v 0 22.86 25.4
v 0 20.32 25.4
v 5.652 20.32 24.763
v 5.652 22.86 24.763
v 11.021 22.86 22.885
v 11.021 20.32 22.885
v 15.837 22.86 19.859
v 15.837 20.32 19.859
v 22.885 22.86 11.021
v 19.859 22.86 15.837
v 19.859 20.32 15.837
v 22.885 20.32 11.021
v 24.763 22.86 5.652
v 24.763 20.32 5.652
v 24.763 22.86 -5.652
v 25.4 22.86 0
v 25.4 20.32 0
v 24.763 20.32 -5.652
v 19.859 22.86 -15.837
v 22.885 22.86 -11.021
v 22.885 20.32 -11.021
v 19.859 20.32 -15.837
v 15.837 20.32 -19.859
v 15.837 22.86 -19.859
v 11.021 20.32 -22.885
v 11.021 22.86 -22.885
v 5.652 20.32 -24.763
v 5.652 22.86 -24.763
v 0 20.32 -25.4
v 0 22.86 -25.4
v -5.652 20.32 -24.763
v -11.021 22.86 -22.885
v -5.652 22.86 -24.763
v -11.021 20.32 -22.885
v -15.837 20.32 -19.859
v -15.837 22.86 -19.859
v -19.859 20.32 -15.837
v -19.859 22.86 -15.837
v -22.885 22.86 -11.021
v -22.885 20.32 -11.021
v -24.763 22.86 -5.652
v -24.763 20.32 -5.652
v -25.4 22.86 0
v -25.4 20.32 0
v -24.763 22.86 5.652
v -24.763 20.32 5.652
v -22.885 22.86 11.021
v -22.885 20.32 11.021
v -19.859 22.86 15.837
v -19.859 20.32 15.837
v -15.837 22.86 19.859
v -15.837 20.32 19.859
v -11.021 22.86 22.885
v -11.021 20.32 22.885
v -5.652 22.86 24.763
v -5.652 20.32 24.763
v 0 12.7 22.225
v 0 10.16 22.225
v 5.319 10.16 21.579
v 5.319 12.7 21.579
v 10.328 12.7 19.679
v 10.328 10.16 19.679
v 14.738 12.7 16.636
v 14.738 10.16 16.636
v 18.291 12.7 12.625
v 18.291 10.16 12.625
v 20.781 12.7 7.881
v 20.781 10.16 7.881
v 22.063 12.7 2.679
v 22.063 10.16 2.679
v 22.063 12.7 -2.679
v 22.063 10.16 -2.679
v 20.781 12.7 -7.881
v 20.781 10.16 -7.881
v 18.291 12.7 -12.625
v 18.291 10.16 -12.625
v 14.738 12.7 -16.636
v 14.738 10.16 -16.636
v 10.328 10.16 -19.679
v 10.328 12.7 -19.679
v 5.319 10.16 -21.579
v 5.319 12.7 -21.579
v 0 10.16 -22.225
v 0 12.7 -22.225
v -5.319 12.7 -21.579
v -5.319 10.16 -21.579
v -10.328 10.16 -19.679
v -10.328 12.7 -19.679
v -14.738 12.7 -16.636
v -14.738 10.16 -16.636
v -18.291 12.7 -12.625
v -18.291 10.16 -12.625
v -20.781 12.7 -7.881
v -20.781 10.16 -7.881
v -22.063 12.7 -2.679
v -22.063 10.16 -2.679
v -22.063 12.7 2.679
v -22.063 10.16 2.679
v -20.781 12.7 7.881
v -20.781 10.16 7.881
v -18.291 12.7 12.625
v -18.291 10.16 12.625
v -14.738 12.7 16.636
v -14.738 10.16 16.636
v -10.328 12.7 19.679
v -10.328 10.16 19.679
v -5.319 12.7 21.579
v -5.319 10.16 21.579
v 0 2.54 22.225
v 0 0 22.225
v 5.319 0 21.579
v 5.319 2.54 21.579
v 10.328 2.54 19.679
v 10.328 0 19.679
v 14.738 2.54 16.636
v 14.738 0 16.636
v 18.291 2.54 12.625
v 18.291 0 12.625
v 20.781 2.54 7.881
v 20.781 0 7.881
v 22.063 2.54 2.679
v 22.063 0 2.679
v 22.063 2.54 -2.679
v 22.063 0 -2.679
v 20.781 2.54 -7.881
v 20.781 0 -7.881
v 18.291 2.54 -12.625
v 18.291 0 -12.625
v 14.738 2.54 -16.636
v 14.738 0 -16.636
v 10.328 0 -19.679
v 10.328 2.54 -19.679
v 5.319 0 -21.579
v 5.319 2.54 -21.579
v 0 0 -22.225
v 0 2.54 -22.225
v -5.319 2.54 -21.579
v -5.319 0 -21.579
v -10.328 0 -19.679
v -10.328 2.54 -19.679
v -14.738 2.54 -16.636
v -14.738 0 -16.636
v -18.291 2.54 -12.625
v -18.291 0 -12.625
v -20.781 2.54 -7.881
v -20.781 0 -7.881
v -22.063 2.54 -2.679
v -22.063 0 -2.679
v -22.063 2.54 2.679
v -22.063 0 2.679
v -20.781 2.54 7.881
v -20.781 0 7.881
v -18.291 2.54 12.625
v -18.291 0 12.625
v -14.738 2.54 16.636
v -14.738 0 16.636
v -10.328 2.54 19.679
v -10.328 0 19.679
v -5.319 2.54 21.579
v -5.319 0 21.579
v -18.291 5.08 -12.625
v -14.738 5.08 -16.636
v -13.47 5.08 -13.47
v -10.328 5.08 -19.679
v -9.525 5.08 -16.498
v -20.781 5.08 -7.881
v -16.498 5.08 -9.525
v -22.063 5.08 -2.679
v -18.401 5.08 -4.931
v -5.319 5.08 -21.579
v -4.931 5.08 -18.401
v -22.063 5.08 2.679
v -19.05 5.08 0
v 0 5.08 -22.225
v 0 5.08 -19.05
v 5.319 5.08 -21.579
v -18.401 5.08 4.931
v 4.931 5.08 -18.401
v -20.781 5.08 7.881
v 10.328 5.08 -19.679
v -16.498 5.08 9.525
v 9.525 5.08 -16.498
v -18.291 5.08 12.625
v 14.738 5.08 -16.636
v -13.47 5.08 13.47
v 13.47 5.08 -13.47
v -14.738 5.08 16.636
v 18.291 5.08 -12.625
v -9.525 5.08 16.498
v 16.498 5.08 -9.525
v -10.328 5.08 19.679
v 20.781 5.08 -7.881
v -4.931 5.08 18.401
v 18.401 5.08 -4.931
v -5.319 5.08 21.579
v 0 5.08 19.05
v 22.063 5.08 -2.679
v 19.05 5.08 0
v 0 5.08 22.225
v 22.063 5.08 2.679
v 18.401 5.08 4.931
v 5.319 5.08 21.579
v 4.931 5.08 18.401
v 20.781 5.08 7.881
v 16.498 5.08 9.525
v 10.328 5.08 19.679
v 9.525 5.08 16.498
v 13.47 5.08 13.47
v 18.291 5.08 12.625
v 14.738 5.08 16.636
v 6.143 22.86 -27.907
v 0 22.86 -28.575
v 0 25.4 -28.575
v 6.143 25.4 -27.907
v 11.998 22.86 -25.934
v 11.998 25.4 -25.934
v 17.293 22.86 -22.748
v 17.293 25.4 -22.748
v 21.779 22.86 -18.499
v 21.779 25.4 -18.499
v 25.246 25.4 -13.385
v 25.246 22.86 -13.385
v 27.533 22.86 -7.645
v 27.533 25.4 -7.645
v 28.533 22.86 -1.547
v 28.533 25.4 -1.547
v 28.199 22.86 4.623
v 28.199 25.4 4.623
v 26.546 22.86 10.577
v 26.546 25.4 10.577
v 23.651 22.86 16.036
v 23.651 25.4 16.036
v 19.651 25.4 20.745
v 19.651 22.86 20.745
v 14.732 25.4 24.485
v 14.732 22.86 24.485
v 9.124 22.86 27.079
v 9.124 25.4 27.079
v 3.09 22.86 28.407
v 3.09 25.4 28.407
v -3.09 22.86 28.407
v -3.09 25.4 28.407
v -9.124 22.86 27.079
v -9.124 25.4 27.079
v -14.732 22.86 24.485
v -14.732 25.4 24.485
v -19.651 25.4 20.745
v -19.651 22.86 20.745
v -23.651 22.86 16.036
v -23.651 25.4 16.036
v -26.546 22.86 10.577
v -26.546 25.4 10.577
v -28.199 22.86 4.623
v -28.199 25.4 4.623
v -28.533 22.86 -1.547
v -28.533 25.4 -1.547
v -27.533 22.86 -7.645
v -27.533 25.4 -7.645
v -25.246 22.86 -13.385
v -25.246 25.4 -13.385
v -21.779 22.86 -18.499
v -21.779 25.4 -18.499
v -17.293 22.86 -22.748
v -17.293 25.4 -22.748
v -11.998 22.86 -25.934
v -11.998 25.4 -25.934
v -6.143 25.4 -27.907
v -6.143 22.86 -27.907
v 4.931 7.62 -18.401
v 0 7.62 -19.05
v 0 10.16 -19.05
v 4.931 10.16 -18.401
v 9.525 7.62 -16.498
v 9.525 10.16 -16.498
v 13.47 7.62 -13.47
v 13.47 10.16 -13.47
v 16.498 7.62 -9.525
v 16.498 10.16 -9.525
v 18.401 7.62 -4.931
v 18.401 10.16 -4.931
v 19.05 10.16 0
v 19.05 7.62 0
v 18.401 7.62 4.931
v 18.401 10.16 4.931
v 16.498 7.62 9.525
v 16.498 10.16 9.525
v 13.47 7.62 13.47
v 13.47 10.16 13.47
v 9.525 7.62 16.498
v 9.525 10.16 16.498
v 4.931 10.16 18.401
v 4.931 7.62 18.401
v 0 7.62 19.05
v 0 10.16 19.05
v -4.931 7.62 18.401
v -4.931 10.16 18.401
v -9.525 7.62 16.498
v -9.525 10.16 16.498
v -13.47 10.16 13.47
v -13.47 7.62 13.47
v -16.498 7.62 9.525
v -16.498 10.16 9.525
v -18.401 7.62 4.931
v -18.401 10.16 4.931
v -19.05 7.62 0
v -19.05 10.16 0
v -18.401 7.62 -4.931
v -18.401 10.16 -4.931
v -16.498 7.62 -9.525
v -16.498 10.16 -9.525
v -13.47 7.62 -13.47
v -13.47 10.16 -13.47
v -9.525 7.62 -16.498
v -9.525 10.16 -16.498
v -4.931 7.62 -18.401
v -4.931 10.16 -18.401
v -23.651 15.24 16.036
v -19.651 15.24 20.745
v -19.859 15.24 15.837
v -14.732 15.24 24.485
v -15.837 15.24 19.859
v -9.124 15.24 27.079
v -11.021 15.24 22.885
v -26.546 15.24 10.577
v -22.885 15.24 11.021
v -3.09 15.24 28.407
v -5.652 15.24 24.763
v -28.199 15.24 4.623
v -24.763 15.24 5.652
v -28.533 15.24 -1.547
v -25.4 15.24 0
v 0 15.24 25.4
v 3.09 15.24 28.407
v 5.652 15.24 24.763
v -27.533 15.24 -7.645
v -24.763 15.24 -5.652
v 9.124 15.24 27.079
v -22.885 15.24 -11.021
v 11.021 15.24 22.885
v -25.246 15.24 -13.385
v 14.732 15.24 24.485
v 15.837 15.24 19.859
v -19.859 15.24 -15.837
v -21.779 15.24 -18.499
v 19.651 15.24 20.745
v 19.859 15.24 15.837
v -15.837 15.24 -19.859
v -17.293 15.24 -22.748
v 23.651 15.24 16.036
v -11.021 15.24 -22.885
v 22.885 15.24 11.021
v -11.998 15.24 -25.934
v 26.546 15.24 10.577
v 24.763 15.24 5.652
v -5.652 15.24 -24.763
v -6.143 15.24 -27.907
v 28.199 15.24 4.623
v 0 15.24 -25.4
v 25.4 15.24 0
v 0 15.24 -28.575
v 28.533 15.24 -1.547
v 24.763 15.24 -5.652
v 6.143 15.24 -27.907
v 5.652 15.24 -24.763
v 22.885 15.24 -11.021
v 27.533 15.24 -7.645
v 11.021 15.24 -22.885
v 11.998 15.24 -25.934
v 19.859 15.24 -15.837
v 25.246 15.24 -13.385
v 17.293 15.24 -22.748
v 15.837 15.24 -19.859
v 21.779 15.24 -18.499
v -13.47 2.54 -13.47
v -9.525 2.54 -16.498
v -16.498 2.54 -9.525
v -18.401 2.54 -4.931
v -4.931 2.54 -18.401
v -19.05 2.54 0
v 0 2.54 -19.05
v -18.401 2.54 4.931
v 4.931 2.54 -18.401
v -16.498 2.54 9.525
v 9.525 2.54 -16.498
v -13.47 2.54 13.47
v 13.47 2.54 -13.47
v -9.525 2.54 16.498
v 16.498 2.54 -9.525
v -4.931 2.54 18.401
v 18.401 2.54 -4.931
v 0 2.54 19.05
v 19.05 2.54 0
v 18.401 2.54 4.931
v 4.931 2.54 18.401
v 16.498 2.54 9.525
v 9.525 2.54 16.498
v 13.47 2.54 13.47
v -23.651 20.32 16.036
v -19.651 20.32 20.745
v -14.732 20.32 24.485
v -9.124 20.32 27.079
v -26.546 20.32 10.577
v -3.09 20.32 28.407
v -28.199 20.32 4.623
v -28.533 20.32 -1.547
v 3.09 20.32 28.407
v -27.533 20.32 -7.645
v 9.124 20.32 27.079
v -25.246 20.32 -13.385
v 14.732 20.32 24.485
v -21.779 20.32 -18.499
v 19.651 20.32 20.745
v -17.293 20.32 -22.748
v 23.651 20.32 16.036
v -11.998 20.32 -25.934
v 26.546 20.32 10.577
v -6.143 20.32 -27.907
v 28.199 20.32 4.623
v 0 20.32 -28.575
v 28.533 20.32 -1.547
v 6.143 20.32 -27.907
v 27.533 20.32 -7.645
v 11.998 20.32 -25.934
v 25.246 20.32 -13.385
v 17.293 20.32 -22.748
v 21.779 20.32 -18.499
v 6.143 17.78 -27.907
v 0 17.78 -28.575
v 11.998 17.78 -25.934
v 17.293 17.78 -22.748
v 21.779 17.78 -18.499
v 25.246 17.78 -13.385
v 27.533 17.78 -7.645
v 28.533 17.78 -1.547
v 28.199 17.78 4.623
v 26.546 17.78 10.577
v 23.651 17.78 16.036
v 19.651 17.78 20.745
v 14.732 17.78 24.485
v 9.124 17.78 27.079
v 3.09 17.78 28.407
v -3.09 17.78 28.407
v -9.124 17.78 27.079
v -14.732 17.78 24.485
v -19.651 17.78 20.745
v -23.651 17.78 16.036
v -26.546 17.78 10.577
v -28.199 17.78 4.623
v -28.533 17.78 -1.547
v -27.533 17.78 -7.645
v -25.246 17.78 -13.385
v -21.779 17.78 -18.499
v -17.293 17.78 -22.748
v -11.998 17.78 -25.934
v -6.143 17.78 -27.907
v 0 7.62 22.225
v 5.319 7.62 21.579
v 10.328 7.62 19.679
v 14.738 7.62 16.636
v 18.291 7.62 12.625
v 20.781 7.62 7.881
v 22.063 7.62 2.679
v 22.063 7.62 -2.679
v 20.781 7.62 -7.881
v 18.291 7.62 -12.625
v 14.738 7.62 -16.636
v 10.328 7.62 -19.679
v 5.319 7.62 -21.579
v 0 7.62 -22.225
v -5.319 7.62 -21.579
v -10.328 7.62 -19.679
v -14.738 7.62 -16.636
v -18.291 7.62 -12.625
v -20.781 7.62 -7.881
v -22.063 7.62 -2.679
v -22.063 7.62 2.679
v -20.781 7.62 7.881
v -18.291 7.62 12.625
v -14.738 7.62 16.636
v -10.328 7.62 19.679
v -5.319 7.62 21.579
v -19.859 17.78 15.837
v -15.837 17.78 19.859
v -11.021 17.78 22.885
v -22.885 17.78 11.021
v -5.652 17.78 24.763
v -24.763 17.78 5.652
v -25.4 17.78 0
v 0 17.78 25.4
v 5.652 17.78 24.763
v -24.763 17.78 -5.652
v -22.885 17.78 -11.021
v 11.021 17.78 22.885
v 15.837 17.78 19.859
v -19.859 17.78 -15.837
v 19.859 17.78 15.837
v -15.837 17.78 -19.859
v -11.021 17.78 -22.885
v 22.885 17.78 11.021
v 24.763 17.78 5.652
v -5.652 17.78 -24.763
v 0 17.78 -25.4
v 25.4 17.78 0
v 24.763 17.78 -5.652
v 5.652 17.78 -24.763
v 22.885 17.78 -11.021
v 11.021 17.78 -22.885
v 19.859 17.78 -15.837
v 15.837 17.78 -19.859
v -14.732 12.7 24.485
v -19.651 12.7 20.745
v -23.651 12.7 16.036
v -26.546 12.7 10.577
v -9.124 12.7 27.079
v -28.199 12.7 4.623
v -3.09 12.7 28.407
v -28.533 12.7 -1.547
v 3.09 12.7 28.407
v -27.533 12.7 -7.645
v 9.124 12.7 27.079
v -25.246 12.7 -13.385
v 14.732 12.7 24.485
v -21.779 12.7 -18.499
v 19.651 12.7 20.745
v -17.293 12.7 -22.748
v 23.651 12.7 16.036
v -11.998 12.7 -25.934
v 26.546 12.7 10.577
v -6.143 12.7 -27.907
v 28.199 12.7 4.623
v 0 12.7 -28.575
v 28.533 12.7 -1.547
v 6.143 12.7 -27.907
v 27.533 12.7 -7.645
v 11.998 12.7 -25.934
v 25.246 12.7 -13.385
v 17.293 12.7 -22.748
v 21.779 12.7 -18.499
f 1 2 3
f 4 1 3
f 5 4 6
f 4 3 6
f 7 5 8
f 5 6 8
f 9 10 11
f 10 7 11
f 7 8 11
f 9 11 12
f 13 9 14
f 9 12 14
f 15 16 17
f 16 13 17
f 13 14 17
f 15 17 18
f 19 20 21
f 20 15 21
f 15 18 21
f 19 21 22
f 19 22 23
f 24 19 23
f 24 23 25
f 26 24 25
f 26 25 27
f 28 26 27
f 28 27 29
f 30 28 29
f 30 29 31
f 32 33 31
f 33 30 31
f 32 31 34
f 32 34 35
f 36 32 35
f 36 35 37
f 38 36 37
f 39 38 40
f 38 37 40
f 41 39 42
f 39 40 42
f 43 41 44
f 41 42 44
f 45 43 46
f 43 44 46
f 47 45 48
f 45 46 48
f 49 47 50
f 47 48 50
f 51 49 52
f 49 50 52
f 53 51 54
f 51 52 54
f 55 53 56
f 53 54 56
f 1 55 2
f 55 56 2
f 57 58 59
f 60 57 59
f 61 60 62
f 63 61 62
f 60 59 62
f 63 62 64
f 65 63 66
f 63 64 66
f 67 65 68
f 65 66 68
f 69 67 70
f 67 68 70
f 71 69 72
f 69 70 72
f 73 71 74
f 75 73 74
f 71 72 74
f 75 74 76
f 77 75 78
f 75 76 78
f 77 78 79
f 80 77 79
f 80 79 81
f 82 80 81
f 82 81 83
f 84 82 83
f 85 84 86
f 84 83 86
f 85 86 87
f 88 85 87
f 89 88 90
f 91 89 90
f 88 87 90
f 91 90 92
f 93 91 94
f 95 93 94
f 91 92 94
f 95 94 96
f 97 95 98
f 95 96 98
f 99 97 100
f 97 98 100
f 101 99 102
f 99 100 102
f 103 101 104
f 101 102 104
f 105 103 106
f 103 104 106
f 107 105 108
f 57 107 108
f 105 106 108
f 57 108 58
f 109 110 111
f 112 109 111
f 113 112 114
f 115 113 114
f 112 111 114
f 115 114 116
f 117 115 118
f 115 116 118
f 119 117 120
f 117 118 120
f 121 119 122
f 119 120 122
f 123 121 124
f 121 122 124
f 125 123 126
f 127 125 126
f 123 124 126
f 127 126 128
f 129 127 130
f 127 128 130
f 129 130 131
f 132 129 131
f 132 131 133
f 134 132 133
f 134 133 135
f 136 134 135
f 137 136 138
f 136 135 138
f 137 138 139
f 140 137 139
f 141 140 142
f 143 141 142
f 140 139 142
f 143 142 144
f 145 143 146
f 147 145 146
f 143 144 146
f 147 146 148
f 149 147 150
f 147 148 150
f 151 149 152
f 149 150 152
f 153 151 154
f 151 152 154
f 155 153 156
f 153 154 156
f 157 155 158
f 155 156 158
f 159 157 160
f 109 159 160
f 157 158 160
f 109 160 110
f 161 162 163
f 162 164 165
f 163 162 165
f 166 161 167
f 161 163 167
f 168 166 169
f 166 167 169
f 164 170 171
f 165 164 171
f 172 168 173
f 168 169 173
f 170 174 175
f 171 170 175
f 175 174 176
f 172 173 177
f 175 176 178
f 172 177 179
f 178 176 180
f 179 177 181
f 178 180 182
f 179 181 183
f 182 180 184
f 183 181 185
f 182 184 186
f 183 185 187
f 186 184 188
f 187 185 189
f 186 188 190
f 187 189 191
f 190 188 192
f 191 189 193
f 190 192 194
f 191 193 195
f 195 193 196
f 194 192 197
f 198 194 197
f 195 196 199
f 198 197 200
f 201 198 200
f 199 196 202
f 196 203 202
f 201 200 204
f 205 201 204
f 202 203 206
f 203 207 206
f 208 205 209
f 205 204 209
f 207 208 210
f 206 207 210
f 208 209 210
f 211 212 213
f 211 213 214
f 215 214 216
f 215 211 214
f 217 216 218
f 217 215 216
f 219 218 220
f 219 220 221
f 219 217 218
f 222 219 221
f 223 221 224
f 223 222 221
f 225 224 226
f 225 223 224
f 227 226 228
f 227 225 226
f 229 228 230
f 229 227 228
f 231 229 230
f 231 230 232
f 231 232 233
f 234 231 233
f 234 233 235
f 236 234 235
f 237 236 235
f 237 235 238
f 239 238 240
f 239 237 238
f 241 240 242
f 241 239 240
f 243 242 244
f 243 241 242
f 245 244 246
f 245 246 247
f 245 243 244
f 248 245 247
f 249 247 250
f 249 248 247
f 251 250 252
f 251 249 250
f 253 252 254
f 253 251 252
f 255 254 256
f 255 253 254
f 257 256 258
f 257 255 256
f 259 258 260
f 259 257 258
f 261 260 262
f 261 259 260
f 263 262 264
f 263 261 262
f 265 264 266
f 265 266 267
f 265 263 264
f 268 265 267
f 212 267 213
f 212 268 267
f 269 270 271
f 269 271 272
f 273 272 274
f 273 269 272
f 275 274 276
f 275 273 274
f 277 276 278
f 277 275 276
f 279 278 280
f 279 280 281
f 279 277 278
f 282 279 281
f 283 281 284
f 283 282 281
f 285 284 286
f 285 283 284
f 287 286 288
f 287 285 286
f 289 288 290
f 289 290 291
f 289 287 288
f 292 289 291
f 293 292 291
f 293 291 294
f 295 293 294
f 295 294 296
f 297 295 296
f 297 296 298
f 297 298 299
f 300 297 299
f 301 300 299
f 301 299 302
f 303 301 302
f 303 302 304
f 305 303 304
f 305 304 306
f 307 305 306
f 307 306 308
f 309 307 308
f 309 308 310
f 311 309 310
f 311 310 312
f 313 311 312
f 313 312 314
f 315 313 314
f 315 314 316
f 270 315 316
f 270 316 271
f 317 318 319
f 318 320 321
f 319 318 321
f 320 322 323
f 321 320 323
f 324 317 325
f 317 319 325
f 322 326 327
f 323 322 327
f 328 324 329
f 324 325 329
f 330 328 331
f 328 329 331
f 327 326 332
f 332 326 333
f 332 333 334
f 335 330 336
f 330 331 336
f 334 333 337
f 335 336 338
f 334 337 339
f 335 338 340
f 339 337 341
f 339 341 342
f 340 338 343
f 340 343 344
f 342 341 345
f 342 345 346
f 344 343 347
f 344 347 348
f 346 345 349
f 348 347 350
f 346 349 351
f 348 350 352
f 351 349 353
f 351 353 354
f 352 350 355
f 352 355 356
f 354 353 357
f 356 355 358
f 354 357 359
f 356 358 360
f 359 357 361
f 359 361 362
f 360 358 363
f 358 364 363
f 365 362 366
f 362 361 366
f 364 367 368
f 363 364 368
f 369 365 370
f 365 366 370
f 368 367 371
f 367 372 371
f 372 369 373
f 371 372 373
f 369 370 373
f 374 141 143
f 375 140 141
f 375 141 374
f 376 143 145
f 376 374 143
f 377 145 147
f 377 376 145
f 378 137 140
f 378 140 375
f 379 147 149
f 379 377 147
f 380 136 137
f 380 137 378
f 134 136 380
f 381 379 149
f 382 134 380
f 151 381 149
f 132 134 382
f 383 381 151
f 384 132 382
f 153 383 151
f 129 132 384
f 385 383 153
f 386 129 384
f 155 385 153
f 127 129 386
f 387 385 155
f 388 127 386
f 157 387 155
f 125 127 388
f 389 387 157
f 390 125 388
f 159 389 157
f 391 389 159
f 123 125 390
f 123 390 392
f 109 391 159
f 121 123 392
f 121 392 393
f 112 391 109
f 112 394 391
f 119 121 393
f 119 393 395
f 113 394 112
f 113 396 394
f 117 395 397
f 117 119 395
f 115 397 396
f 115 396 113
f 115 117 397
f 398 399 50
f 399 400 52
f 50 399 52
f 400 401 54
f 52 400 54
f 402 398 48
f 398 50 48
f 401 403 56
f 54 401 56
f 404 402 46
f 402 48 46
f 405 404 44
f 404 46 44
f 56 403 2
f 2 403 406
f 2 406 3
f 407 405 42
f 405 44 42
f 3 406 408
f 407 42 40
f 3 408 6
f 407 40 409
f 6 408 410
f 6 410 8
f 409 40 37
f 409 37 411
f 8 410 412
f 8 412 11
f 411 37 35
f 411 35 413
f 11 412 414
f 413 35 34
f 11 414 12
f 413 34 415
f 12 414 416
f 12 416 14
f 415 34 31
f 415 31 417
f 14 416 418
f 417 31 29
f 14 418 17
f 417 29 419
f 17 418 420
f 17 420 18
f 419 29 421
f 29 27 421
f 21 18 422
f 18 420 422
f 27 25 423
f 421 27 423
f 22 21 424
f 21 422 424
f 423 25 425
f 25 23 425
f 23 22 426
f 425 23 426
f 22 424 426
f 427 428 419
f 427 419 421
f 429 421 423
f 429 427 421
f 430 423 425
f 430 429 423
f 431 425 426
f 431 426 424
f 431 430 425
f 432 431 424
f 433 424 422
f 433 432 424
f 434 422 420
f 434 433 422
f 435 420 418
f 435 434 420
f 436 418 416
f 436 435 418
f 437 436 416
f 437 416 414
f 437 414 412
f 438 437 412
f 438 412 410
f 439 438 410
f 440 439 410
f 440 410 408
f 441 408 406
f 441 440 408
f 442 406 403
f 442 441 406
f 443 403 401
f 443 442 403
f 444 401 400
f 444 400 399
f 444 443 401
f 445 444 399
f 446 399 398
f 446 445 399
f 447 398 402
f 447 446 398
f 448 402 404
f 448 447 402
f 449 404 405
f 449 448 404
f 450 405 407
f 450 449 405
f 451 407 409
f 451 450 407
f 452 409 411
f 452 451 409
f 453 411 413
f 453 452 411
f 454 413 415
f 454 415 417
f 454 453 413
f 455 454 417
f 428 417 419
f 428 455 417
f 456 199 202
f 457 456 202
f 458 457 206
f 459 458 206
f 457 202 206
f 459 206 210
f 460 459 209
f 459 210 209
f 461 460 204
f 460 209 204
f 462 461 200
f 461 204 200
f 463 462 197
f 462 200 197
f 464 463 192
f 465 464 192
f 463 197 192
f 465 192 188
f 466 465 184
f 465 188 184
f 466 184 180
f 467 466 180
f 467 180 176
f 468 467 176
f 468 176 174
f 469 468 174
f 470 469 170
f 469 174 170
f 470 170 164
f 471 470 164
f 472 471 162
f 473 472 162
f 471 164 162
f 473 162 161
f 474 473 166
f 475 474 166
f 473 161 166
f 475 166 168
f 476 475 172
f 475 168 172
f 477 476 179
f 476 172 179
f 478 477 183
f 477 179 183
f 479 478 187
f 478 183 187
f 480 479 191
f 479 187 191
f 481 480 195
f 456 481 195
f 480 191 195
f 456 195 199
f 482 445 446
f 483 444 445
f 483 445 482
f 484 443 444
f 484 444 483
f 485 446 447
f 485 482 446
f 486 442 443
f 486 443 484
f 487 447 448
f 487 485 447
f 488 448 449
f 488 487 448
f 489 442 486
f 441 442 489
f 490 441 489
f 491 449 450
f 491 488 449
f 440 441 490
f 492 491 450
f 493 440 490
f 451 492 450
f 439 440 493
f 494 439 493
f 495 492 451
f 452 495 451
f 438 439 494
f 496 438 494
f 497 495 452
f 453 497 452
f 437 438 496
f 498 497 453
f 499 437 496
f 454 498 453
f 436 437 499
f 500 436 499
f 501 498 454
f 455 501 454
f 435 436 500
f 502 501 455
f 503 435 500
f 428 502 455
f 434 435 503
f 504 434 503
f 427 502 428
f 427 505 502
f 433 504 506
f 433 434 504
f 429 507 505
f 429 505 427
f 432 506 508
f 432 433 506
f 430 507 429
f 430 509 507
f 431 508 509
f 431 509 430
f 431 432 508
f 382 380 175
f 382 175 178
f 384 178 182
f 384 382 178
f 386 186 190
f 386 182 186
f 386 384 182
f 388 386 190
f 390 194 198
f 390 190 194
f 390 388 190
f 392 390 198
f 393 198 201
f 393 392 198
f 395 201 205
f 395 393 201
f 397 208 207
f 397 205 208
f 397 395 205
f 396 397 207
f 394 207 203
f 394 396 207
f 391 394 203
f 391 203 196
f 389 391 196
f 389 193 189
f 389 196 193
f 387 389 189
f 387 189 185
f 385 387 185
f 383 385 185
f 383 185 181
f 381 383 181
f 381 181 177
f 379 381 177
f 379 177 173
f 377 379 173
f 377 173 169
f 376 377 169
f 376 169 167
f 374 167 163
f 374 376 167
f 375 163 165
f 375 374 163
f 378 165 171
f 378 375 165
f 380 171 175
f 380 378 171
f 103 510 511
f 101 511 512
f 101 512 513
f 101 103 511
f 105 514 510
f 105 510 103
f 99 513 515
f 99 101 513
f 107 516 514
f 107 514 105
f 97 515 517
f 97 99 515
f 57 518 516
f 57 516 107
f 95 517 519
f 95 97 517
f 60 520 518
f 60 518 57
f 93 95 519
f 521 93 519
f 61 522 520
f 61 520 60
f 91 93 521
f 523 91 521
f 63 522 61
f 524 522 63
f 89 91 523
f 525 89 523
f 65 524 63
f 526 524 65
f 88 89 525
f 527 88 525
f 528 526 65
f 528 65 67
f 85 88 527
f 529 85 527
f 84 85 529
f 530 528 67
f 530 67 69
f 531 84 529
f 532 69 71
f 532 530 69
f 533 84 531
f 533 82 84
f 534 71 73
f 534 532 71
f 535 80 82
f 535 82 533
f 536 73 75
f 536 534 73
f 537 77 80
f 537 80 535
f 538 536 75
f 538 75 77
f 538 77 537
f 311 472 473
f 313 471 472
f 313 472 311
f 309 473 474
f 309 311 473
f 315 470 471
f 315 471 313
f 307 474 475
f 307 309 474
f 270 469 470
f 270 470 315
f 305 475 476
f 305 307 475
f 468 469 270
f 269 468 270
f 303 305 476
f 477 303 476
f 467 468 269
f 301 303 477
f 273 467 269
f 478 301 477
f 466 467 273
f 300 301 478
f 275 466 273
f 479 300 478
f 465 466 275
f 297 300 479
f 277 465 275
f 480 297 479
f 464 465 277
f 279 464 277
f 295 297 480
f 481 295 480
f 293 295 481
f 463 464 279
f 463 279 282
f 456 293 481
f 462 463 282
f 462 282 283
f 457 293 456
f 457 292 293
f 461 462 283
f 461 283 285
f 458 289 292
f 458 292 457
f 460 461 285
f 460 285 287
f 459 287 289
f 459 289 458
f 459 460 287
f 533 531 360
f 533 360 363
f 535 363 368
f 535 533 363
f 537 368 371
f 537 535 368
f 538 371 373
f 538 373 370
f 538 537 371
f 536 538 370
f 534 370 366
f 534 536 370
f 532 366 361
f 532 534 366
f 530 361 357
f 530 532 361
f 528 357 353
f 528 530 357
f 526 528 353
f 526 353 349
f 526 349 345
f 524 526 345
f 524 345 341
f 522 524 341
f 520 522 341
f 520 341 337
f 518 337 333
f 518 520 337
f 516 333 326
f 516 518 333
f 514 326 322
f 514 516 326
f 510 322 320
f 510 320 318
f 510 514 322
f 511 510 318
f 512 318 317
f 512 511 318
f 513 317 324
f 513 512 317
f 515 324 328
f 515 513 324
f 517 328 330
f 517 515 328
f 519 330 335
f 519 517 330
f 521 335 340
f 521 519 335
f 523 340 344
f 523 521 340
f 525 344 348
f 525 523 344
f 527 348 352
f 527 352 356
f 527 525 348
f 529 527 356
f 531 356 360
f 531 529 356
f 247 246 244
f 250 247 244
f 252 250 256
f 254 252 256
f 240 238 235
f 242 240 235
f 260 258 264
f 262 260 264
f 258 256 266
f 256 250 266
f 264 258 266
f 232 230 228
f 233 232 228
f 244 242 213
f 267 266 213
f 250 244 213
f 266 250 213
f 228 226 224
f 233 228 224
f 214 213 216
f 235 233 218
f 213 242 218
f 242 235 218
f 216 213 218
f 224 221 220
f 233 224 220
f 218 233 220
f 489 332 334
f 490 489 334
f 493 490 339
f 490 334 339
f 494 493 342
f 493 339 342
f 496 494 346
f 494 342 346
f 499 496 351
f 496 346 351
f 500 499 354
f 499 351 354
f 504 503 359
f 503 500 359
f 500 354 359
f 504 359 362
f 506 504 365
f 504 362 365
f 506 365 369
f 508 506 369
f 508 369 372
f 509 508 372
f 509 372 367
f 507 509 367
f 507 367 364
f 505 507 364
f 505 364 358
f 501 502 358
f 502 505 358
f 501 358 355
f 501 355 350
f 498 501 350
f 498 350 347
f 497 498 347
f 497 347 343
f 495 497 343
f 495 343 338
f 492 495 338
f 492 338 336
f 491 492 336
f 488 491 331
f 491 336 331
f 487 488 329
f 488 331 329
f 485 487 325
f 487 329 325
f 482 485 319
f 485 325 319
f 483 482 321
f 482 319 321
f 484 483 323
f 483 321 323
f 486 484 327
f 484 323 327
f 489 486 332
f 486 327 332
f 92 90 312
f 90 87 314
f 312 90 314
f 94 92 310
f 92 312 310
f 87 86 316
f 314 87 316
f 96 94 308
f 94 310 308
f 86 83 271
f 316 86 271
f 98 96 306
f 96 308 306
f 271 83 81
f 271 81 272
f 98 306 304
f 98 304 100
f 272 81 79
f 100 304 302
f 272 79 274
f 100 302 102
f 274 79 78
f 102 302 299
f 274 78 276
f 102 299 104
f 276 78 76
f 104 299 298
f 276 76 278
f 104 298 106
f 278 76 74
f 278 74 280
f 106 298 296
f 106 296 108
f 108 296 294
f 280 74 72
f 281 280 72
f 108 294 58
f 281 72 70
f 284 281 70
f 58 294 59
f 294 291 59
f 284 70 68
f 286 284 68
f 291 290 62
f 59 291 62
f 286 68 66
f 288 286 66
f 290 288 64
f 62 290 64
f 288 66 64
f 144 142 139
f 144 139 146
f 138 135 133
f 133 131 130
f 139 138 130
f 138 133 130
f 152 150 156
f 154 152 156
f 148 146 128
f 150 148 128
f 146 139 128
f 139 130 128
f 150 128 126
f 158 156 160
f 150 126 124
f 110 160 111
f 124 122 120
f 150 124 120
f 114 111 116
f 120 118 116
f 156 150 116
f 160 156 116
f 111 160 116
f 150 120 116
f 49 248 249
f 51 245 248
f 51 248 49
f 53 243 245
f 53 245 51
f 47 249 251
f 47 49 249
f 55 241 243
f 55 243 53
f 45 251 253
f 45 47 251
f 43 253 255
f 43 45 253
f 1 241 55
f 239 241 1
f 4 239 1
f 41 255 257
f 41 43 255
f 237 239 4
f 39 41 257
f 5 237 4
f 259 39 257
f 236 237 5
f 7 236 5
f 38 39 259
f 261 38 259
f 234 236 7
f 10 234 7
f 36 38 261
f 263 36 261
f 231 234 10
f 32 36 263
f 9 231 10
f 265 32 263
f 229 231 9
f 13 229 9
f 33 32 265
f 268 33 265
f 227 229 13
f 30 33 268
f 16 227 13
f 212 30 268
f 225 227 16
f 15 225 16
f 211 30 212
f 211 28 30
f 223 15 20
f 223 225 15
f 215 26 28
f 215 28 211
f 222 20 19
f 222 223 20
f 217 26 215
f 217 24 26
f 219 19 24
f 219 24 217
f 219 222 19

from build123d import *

# Parameters (mm, degrees)
SKETCH1_R           = 22.225
SKETCH1_R_2         = 19.05
BOSS_EXTRUDE1_DEPTH = 2.54
SKETCH3_R           = 19.05
BOSS_EXTRUDE2_DEPTH = 12.7
LPATTERN1_COUNT     = 3
LPATTERN1_PITCH     = 5.08
SKETCH5_R           = 25.4
SKETCH5_R_2         = 22.225
BOSS_EXTRUDE3_DEPTH = 12.7
SKETCH7_R           = 28.575
BOSS_EXTRUDE4_DEPTH = 2.54
LPATTERN2_COUNT     = 3
LPATTERN2_PITCH     = 5.08


with BuildPart() as part:
    # Sketch1 → Boss-Extrude1 (new body)
    with BuildSketch(Plane(origin=(0, 0, 0), x_dir=(1, 0, 0), z_dir=(0, 1, 0))):
        with Locations(Location((0, 0, 0), (0, 0, 270))):
            Circle(SKETCH1_R)
        with Locations(Location((0, 0, 0), (0, 0, 270))):
            Circle(SKETCH1_R_2, mode=Mode.SUBTRACT)
    boss_extrude1 = extrude(amount=BOSS_EXTRUDE1_DEPTH)

    # Sketch3 → Boss-Extrude2 (add)
    with BuildSketch(Plane.XZ):
        with Locations(Location((0, 0, 0), (0, 0, 270))):
            Circle(SKETCH3_R)
    extrude(amount=-BOSS_EXTRUDE2_DEPTH)

    # LPattern1: Boss-Extrude1 ×3
    with Locations(*[(0, i * LPATTERN1_PITCH, 0) for i in range(1, LPATTERN1_COUNT)]):
        add(boss_extrude1)

    # Sketch5 → Boss-Extrude3 (add)
    # profile 1 of 2: a face of its own
    with BuildSketch(Plane(origin=(0, 12.7, 0), x_dir=(1, 0, 0), z_dir=(0, 1, 0))):
        with Locations(Location((0, 0, 0), (0, 0, 270))):
            Circle(SKETCH5_R)
        with Locations(Location((0, 0, 0), (0, 0, 270))):
            Circle(SKETCH5_R_2, mode=Mode.SUBTRACT)
    # profile 2 of 2: a face of its own
    with BuildSketch(Plane(origin=(0, 12.7, 0), x_dir=(1, 0, 0), z_dir=(0, 1, 0))):
        with Locations(Location((0, 0, 0), (0, 0, 270))):
            Circle(SKETCH5_R_2)
    extrude(amount=BOSS_EXTRUDE3_DEPTH)

    # Sketch7 → Boss-Extrude4 (add)
    with BuildSketch(Plane.XZ.offset(-12.7)):
        with Locations(Location((0, 0, 0), (0, 0, 270))):
            Circle(SKETCH7_R)
    boss_extrude4 = extrude(amount=-BOSS_EXTRUDE4_DEPTH)

    # LPattern2: Boss-Extrude4 ×3
    with Locations(*[(0, i * LPATTERN2_PITCH, 0) for i in range(1, LPATTERN2_COUNT)]):
        add(boss_extrude4)


solid = part.part
